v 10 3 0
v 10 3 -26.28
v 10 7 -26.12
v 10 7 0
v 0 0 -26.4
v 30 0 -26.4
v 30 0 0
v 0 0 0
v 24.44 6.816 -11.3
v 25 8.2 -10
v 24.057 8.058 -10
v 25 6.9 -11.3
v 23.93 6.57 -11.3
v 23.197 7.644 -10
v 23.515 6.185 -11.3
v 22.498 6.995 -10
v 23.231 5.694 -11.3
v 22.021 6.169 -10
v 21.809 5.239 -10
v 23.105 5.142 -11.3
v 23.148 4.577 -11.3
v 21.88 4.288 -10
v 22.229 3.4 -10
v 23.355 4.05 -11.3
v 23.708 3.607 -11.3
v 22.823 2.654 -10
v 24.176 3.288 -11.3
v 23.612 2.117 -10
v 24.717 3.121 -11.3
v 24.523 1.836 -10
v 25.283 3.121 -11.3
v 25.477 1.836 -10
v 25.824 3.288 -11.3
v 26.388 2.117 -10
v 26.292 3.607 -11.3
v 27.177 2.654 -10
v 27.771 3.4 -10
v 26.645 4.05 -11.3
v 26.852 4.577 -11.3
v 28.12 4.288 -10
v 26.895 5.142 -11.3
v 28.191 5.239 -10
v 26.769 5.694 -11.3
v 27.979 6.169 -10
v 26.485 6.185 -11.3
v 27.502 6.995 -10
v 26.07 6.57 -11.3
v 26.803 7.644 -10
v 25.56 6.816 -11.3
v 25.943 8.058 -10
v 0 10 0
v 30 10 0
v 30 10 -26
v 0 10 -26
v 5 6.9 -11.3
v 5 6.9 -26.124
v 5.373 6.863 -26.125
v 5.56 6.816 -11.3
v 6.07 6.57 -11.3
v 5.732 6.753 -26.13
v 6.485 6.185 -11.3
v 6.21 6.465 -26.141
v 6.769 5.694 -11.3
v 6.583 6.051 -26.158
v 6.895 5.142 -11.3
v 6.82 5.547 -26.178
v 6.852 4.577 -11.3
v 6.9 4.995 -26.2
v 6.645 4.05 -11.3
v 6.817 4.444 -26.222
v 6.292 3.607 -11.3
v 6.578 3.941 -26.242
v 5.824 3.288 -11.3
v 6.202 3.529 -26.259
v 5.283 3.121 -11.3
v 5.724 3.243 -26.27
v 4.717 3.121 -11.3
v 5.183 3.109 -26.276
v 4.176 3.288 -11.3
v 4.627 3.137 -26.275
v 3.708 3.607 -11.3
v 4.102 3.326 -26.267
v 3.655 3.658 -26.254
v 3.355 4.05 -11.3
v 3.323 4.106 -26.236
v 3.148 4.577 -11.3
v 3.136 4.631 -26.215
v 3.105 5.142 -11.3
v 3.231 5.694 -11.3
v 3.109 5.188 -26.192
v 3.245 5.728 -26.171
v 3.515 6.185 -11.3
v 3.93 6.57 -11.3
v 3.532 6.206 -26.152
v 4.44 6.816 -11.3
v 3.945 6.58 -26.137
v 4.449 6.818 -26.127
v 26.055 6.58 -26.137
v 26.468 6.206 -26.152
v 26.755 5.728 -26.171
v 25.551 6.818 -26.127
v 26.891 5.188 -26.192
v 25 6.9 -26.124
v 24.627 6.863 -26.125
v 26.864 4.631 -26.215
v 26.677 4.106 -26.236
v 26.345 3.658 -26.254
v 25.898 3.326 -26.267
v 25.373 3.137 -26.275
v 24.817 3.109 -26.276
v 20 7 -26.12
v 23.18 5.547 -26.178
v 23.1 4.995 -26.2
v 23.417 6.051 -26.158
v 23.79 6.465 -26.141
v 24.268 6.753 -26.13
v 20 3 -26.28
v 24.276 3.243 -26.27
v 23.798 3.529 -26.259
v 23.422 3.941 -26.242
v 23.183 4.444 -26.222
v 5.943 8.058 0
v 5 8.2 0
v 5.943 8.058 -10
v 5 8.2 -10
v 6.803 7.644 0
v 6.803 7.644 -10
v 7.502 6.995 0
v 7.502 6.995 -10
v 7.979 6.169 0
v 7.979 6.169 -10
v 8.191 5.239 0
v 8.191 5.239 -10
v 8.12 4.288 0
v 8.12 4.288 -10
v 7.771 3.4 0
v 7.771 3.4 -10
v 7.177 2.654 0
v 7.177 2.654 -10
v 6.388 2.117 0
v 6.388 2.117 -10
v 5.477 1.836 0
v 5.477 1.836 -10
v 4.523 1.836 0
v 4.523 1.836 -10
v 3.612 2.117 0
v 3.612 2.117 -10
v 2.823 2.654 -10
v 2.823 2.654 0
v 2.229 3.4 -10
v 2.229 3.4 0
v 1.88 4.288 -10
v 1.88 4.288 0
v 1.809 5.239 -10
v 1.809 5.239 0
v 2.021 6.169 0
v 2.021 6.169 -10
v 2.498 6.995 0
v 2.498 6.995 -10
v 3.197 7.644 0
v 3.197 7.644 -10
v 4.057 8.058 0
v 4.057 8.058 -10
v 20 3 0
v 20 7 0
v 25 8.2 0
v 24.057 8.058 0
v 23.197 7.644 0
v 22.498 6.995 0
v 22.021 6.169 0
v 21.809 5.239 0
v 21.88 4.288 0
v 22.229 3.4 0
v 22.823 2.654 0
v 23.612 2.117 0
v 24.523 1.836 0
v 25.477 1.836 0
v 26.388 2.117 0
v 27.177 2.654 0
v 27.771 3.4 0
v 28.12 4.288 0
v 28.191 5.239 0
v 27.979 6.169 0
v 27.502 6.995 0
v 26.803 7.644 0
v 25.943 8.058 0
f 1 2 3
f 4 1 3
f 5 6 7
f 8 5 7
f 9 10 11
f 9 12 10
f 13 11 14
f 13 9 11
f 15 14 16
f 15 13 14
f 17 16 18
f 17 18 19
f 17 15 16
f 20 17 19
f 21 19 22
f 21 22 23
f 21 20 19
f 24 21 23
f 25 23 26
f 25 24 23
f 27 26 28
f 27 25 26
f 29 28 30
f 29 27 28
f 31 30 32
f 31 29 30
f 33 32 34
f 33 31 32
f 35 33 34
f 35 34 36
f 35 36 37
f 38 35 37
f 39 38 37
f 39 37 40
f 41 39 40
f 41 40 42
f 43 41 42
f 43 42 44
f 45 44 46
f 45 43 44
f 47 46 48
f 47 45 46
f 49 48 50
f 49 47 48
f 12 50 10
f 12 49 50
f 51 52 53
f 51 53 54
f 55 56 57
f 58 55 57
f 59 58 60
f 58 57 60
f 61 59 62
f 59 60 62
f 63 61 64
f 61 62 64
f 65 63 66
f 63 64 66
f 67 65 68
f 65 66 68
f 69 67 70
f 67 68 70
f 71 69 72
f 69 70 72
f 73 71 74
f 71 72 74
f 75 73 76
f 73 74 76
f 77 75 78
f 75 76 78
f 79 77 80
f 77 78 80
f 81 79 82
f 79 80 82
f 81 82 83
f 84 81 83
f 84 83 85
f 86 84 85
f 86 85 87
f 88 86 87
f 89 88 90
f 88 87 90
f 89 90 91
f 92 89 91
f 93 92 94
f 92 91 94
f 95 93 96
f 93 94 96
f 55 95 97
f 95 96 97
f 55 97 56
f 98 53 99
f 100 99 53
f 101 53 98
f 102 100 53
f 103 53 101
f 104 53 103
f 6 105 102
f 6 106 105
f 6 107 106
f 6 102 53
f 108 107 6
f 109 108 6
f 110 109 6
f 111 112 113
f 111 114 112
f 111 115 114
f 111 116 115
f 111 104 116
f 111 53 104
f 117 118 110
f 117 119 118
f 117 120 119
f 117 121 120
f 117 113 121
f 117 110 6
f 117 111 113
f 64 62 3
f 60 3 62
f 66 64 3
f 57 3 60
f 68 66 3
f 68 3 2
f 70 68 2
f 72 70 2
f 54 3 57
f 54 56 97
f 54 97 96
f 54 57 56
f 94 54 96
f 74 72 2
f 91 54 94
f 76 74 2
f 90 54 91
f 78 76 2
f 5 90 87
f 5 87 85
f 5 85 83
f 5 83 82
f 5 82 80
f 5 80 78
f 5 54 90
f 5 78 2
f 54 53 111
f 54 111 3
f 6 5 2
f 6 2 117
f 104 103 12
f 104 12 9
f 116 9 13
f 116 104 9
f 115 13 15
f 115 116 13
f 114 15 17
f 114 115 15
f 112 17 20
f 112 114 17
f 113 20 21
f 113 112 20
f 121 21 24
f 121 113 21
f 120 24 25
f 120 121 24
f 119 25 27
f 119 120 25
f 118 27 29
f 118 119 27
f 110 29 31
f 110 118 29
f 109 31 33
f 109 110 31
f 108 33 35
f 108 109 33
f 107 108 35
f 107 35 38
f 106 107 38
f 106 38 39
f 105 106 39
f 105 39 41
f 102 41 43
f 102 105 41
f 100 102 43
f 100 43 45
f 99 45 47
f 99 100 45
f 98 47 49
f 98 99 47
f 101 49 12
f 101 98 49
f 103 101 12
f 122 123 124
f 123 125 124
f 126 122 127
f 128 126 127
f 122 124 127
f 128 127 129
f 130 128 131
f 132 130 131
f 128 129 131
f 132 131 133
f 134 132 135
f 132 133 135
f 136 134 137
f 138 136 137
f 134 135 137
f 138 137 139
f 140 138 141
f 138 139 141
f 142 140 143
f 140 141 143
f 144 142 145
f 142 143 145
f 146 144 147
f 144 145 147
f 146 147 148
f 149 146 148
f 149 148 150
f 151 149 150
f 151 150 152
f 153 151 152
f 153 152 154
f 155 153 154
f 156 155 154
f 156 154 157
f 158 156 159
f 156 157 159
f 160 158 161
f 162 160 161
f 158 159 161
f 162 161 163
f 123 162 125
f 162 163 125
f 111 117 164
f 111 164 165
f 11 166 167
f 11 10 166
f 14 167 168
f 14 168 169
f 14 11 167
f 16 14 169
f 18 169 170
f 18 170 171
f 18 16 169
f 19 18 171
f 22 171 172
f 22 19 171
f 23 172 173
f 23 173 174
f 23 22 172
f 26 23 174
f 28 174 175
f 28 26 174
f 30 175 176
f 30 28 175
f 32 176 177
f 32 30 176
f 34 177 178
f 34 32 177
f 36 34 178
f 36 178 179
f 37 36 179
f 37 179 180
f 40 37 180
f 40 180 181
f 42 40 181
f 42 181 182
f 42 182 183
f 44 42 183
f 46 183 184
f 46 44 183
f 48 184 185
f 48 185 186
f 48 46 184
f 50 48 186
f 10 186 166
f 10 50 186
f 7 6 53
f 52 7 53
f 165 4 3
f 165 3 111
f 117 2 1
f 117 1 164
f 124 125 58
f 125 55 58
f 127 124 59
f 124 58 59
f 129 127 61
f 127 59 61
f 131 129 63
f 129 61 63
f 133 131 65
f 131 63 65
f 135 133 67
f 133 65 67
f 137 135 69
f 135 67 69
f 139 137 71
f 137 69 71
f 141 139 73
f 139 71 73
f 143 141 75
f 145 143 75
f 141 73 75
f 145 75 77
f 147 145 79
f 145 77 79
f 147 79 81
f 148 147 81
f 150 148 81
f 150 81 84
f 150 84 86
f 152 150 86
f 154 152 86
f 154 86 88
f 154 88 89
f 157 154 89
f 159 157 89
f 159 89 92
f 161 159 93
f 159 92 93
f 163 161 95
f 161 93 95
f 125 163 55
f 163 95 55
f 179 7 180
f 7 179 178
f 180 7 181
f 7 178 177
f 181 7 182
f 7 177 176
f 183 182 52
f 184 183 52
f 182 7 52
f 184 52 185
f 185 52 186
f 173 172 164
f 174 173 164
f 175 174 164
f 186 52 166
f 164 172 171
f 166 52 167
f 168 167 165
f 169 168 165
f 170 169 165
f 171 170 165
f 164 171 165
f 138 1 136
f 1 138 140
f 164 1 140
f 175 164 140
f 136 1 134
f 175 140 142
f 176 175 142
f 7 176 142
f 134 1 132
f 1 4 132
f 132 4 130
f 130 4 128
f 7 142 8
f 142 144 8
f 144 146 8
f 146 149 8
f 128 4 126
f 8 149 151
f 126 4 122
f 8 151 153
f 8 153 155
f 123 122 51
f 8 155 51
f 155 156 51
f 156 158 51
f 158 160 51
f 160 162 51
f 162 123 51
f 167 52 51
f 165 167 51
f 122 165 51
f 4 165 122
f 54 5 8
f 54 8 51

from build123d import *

# Parameters (mm, degrees)
SKETCH_W     = 15
SKETCH_H     = 10
PAD_DEPTH    = 26
PAD001_DEPTH = 15
SKETCH005_W  = 10
SKETCH005_H  = 4
POCKET_DEPTH = 26.401


with BuildPart() as revolution:
    # Sketch004 → Revolution (revolve)
    with BuildSketch(Plane.YZ.offset(5)):
        Polygon((5, 0), (8.2, 0), (8.2, 10), (6.9, 11.3), (6.9, 27), (5, 27), align=None)
    revolve(axis=Axis((5, 5, 13.2), (0, 0, -1)))


with BuildPart() as pad:
    # Sketch → Pad (new body)
    with BuildSketch(Plane.XY):
        with Locations((7.5, 5)):
            Rectangle(SKETCH_W, SKETCH_H)
    extrude(amount=PAD_DEPTH)


with BuildPart() as pad001:
    # Pad001 base: copy of Pad
    add(pad.part)

    # Sketch001 → Pad001 (new body)
    with BuildSketch(Plane.YZ.offset(15)):
        Polygon((0, 26), (10, 26), (0, 26.4), align=None)
    extrude(amount=-PAD001_DEPTH)


with BuildPart() as cut:
    # Fusion base: copy of Pad
    add(pad.part)

    # Fusion: union Pad001
    add(pad001.part)

    # Cut: cut Revolution
    add(revolution.part, mode=Mode.SUBTRACT)


with BuildPart() as part_mirroring:
    # Part__Mirroring: instance of Cut
    add(cut.part.mirror(Plane(origin=(15, 0, 0), x_dir=(0, -1, 0), z_dir=(1, 0, 0))))


with BuildPart() as fusion001:
    # Fusion001 base: copy of Cut
    add(cut.part)

    # Fusion001: union Part__Mirroring
    add(part_mirroring.part)


with BuildPart() as pocket:
    # Part__Mirroring001: instance of Fusion001
    add(fusion001.part.mirror(Plane(origin=(0, 0, 0), x_dir=(0, 1, 0), z_dir=(0, 0, 1))))

    # Sketch005 → Pocket (cut, through all)
    with BuildSketch(Plane.XY):
        with Locations((15, 5)):
            Rectangle(SKETCH005_W, SKETCH005_H)
    extrude(amount=-POCKET_DEPTH, mode=Mode.SUBTRACT)


solid = pocket.part
